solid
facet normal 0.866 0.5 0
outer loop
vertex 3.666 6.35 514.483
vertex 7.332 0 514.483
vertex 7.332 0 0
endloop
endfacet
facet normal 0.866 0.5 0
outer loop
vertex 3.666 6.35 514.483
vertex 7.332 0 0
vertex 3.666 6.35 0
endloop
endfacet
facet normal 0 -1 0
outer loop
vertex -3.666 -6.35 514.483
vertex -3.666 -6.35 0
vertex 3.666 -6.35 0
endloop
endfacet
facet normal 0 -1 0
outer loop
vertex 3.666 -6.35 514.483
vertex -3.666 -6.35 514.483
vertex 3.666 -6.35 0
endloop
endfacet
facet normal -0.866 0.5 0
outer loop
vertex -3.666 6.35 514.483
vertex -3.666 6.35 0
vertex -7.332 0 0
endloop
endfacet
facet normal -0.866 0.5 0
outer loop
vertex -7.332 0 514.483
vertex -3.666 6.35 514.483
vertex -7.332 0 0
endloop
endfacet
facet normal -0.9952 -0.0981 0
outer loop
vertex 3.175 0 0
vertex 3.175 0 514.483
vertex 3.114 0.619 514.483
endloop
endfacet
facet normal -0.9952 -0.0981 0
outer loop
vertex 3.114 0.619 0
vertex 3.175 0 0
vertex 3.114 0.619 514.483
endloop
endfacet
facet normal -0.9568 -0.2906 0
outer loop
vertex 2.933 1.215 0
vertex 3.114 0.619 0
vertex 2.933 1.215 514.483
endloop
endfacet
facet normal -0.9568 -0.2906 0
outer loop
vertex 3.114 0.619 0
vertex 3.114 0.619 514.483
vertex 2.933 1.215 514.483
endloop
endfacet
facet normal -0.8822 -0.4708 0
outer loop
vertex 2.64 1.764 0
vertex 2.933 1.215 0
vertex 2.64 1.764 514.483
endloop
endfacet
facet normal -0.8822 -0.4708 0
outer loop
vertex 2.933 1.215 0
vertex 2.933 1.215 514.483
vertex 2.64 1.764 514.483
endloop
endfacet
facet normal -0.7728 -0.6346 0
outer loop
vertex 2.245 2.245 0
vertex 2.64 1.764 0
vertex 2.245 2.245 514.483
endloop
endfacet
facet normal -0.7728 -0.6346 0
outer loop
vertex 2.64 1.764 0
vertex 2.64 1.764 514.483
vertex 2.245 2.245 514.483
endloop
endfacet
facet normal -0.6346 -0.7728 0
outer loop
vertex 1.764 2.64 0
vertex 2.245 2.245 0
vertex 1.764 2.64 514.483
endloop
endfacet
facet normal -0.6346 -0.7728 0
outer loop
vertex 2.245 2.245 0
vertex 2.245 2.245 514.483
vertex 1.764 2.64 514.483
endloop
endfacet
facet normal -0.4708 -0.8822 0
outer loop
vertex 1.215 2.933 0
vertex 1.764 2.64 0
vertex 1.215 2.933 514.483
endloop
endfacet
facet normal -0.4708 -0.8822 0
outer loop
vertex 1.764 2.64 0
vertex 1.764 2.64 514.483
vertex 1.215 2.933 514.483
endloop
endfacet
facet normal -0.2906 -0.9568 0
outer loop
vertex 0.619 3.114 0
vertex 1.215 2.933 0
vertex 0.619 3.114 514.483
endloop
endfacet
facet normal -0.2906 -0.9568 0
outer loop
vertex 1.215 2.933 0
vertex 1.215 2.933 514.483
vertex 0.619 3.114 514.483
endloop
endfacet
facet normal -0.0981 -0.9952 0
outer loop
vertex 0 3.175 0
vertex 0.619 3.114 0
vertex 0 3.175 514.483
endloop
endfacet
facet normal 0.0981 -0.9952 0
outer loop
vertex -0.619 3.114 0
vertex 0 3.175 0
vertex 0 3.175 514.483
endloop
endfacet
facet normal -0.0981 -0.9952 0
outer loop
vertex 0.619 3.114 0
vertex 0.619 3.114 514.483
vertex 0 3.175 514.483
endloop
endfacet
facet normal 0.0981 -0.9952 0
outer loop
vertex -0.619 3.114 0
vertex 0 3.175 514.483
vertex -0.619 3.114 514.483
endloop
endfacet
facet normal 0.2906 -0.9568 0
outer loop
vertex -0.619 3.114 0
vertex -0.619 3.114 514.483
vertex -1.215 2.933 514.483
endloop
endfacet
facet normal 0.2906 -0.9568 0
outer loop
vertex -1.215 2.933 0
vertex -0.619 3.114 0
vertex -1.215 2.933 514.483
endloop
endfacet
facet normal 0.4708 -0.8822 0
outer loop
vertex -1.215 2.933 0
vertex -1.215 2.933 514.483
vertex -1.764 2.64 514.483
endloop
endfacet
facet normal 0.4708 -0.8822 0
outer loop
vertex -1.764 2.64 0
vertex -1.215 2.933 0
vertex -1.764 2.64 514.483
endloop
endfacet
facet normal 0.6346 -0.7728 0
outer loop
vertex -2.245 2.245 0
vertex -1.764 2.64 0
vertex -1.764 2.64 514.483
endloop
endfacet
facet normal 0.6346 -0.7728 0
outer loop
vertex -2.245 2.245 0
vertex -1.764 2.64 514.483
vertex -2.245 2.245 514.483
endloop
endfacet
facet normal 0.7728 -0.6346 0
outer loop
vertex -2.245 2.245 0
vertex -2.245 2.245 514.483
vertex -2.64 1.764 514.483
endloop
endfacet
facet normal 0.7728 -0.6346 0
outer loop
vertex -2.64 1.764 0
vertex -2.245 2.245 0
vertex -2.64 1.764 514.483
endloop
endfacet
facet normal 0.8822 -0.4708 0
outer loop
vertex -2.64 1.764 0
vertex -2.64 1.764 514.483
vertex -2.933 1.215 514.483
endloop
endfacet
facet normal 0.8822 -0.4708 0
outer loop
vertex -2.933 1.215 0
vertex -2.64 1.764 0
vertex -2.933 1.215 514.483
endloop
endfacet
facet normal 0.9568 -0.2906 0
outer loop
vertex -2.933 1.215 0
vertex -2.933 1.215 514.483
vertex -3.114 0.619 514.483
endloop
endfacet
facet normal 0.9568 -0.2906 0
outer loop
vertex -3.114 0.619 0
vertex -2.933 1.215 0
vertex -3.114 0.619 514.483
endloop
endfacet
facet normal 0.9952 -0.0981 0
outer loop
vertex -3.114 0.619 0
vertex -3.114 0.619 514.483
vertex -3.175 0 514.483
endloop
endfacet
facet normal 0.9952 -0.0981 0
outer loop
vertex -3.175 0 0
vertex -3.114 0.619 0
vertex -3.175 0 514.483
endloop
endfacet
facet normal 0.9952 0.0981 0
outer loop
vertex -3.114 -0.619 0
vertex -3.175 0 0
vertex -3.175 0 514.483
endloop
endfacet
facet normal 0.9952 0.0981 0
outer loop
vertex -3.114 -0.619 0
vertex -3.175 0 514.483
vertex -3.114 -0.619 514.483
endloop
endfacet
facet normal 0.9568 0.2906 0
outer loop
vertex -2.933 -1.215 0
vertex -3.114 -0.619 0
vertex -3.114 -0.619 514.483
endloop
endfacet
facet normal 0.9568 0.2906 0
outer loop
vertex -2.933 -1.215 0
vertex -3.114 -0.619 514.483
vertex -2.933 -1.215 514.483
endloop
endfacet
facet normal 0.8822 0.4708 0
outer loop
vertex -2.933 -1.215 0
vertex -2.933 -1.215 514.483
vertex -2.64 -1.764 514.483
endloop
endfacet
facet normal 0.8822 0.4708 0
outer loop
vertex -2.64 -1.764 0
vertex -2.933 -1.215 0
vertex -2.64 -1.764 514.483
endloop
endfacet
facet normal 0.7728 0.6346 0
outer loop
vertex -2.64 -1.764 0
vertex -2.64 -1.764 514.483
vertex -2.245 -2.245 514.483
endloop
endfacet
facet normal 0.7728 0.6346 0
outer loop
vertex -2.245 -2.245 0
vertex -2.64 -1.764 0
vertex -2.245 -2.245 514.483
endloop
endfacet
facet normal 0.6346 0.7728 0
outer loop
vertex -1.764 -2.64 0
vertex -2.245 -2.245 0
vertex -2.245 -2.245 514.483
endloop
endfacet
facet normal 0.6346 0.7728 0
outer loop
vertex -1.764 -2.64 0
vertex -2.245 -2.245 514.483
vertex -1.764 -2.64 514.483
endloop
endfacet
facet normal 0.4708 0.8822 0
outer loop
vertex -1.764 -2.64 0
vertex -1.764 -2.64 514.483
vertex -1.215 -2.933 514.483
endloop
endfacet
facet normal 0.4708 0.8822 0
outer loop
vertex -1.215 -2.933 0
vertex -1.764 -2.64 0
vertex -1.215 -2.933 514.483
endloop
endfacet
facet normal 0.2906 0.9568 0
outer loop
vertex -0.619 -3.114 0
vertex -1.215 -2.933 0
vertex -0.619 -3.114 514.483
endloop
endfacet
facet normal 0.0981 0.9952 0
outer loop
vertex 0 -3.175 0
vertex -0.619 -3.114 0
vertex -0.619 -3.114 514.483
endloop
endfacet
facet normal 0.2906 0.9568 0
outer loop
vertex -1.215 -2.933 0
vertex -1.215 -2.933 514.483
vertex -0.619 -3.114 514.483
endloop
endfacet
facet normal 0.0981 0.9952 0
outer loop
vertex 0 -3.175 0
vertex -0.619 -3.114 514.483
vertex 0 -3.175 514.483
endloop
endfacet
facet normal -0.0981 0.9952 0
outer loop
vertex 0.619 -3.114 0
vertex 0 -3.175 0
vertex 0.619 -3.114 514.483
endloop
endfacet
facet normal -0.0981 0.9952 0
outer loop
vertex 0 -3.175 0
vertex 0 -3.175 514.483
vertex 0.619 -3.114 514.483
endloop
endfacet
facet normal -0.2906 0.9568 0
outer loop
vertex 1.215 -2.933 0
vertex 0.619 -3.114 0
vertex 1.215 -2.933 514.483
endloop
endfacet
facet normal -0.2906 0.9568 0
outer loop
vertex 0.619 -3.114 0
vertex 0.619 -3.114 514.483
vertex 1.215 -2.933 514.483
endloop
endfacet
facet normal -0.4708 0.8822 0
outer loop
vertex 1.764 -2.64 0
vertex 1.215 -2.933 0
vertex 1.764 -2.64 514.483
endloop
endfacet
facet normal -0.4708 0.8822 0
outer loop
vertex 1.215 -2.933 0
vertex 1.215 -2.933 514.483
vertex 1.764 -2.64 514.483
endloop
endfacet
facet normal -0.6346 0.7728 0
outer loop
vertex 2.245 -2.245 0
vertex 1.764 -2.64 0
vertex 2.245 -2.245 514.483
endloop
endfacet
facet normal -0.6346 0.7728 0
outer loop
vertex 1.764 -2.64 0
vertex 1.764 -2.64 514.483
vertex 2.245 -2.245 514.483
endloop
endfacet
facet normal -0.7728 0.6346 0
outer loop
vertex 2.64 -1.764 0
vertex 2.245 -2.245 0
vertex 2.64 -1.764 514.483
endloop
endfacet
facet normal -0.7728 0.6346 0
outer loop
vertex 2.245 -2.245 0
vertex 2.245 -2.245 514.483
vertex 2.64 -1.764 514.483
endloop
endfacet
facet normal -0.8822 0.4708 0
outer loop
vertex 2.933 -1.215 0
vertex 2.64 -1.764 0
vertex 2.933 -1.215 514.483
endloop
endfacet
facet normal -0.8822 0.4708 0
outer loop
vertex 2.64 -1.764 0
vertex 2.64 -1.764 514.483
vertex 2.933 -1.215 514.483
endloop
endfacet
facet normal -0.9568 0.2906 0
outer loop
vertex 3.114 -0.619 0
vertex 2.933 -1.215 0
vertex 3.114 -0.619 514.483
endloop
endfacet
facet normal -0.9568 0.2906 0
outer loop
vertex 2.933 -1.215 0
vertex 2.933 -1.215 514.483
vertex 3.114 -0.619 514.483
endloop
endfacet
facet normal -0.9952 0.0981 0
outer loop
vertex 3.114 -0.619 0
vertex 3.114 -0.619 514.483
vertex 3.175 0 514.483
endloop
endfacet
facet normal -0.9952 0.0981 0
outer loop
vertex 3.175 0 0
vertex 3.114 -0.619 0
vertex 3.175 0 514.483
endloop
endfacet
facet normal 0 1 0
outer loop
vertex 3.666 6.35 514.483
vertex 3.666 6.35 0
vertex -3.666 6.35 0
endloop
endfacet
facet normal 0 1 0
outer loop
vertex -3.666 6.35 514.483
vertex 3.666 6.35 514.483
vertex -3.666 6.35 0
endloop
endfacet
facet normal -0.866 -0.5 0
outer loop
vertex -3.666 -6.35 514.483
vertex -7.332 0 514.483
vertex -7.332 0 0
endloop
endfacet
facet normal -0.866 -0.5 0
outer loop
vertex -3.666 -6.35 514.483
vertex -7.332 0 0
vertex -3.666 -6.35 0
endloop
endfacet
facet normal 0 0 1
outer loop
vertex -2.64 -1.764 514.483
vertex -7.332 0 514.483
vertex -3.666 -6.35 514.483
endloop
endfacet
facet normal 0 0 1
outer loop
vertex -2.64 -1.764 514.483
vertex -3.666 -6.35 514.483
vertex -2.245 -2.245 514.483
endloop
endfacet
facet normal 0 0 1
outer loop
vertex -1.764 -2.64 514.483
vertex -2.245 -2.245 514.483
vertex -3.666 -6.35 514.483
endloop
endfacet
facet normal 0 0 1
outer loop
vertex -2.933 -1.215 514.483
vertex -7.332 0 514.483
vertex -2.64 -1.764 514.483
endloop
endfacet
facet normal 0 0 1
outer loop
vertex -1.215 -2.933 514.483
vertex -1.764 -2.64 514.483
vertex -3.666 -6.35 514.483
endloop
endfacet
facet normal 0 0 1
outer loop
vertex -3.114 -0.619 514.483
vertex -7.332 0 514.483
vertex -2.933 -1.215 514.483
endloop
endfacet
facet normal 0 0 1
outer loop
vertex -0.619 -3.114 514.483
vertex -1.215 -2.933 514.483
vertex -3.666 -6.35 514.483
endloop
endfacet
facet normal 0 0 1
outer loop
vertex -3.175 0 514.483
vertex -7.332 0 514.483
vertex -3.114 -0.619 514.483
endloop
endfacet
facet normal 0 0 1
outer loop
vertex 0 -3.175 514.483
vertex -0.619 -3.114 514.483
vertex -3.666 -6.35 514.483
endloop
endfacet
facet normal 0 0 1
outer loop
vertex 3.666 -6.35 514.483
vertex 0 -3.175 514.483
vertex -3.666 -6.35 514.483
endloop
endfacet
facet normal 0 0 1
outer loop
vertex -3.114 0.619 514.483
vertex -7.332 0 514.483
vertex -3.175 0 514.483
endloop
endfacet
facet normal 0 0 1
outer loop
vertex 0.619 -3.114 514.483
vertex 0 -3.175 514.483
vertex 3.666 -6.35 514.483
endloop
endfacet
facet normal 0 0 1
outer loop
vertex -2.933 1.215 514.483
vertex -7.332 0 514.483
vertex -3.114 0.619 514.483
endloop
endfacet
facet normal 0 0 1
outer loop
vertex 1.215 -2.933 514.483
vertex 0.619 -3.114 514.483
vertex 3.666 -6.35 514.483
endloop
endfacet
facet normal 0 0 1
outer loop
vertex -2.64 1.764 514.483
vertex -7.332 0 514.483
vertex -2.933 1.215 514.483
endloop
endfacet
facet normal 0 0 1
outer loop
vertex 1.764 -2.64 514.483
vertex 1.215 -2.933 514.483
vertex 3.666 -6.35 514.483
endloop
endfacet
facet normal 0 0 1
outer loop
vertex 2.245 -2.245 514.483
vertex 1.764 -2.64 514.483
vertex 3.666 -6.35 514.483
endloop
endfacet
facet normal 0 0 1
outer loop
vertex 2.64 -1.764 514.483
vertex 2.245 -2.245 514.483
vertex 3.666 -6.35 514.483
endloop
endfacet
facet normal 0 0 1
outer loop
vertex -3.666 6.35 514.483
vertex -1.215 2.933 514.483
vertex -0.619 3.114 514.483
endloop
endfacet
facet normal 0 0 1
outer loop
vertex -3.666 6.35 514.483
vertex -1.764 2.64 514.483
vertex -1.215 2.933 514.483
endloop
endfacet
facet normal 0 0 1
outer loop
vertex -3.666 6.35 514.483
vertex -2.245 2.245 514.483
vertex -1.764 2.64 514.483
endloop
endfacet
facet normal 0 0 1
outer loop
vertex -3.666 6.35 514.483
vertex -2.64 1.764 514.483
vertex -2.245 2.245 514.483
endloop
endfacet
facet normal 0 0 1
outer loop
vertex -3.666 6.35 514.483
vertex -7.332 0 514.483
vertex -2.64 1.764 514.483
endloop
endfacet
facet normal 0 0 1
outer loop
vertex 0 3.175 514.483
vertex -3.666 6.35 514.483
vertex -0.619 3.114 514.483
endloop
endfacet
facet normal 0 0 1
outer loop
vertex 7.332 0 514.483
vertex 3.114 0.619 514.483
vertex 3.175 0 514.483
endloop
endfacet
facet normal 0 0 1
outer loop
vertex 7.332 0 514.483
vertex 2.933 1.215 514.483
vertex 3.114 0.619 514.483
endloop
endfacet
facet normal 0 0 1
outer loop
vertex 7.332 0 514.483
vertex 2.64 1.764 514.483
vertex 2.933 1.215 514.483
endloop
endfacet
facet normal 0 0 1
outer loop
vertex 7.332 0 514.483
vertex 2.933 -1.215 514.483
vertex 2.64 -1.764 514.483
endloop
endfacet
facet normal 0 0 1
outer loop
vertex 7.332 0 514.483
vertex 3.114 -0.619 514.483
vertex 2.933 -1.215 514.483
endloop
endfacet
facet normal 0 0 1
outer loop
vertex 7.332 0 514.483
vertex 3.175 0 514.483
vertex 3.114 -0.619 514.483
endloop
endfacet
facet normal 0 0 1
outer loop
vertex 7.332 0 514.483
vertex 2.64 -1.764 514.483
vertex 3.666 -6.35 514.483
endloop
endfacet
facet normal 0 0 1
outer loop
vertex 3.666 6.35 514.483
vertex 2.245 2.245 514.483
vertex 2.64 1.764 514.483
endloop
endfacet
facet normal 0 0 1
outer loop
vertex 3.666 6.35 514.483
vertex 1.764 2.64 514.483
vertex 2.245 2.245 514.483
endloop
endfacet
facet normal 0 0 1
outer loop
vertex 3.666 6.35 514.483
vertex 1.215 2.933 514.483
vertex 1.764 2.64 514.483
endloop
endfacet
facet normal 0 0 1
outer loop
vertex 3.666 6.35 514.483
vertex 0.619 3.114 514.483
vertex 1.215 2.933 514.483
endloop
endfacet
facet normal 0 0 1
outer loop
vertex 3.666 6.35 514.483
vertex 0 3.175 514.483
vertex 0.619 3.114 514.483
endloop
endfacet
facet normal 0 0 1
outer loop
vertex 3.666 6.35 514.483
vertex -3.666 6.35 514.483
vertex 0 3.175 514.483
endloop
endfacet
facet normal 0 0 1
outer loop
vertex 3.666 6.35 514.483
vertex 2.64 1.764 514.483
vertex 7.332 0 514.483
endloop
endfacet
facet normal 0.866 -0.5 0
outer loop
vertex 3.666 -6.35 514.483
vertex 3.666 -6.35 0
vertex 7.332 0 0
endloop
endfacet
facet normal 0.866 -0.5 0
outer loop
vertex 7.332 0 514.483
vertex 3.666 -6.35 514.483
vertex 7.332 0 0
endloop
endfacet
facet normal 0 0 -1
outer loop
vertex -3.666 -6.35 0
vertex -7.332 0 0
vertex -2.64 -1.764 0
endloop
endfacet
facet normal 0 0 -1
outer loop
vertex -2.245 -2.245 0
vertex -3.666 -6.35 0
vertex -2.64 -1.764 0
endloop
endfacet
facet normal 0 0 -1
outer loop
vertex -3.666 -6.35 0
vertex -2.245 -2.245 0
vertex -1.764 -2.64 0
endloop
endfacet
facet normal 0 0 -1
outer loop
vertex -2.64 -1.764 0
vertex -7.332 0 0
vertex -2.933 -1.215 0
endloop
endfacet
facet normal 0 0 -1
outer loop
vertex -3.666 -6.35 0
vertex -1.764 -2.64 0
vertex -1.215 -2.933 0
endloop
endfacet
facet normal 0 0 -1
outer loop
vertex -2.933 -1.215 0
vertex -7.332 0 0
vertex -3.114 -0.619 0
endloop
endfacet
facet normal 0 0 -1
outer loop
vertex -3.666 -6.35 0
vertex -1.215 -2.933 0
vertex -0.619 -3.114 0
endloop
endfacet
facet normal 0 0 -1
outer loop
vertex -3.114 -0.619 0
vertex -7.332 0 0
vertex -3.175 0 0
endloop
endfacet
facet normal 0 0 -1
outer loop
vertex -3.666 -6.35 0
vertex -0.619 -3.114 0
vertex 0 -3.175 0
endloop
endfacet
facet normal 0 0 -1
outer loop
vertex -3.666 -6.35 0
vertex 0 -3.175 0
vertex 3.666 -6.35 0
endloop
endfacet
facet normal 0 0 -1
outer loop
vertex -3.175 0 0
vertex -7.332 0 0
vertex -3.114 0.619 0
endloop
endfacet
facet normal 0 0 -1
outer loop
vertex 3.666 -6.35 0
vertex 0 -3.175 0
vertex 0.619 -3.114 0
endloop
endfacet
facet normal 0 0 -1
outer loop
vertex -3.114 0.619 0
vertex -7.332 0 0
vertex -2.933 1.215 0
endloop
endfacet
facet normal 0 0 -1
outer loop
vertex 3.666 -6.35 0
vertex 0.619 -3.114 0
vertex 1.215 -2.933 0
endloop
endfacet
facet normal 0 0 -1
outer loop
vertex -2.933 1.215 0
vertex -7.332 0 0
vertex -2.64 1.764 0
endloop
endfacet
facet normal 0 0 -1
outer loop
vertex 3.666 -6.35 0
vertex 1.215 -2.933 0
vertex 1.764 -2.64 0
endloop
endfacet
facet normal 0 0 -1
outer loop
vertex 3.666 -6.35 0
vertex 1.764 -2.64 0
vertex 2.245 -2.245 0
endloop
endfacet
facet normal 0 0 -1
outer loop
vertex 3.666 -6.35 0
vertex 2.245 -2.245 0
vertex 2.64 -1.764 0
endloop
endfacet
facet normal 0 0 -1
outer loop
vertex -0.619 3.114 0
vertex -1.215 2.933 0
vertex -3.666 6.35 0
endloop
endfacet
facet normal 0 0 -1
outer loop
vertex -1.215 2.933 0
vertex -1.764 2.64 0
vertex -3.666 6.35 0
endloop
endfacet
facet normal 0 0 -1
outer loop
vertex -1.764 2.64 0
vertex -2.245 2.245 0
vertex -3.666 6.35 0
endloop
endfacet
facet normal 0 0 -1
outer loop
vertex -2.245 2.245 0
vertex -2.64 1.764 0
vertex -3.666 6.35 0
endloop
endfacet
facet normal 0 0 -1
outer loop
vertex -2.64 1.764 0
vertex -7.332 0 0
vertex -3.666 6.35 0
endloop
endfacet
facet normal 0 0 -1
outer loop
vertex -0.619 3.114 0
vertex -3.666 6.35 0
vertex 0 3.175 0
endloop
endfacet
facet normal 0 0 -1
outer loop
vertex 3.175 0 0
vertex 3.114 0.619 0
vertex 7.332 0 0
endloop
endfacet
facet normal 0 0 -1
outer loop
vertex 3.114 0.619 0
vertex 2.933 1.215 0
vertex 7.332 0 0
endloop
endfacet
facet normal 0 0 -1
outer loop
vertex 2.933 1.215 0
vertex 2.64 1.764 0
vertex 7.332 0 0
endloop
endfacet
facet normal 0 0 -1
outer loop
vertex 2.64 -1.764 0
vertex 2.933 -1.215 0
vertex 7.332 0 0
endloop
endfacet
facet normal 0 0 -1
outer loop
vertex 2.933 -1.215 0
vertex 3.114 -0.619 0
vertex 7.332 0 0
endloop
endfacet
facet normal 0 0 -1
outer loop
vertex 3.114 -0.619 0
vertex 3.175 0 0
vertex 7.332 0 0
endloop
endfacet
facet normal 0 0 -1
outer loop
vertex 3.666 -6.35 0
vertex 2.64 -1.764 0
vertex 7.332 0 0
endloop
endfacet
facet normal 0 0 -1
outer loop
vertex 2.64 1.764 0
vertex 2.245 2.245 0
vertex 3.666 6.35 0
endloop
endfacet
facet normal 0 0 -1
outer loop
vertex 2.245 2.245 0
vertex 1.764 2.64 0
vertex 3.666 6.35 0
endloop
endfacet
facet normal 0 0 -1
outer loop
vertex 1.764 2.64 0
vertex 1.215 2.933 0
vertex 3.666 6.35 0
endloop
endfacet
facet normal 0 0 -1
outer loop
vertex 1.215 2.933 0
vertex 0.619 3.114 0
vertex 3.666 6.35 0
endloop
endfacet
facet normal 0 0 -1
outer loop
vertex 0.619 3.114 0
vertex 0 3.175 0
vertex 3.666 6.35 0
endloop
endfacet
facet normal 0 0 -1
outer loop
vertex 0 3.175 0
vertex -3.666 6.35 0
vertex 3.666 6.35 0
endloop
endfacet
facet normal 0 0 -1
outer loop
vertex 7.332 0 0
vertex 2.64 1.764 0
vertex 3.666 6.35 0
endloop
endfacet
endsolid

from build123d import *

# Parameters (mm, degrees)
BOSS_EXTRUDE1_DEPTH     = 514.48335
SKETCH2_R               = 3.175
CUT_EXTRUDE1_DEPTH      = 1
CUT_EXTRUDE1_DEPTH_BACK = 515.48335


with BuildPart() as part:
    # Sketch1 → Boss-Extrude1 (new body)
    with BuildSketch(Plane.XY):
        Polygon((-7.332348419, 0), (-3.666174209, -6.35), (3.666174209, -6.35), (7.332348419, 0), (3.666174209, 6.35), (-3.666174209, 6.35), align=None)
    extrude(amount=BOSS_EXTRUDE1_DEPTH)

    # Sketch2 → Cut-Extrude1 (cut, two sides)
    with BuildSketch(Plane.XY.offset(514.48335)) as cut_extrude1_sk:
        Circle(SKETCH2_R)
    extrude(amount=CUT_EXTRUDE1_DEPTH, mode=Mode.SUBTRACT)
    extrude(cut_extrude1_sk.sketch, amount=-CUT_EXTRUDE1_DEPTH_BACK, mode=Mode.SUBTRACT)


solid = part.part
